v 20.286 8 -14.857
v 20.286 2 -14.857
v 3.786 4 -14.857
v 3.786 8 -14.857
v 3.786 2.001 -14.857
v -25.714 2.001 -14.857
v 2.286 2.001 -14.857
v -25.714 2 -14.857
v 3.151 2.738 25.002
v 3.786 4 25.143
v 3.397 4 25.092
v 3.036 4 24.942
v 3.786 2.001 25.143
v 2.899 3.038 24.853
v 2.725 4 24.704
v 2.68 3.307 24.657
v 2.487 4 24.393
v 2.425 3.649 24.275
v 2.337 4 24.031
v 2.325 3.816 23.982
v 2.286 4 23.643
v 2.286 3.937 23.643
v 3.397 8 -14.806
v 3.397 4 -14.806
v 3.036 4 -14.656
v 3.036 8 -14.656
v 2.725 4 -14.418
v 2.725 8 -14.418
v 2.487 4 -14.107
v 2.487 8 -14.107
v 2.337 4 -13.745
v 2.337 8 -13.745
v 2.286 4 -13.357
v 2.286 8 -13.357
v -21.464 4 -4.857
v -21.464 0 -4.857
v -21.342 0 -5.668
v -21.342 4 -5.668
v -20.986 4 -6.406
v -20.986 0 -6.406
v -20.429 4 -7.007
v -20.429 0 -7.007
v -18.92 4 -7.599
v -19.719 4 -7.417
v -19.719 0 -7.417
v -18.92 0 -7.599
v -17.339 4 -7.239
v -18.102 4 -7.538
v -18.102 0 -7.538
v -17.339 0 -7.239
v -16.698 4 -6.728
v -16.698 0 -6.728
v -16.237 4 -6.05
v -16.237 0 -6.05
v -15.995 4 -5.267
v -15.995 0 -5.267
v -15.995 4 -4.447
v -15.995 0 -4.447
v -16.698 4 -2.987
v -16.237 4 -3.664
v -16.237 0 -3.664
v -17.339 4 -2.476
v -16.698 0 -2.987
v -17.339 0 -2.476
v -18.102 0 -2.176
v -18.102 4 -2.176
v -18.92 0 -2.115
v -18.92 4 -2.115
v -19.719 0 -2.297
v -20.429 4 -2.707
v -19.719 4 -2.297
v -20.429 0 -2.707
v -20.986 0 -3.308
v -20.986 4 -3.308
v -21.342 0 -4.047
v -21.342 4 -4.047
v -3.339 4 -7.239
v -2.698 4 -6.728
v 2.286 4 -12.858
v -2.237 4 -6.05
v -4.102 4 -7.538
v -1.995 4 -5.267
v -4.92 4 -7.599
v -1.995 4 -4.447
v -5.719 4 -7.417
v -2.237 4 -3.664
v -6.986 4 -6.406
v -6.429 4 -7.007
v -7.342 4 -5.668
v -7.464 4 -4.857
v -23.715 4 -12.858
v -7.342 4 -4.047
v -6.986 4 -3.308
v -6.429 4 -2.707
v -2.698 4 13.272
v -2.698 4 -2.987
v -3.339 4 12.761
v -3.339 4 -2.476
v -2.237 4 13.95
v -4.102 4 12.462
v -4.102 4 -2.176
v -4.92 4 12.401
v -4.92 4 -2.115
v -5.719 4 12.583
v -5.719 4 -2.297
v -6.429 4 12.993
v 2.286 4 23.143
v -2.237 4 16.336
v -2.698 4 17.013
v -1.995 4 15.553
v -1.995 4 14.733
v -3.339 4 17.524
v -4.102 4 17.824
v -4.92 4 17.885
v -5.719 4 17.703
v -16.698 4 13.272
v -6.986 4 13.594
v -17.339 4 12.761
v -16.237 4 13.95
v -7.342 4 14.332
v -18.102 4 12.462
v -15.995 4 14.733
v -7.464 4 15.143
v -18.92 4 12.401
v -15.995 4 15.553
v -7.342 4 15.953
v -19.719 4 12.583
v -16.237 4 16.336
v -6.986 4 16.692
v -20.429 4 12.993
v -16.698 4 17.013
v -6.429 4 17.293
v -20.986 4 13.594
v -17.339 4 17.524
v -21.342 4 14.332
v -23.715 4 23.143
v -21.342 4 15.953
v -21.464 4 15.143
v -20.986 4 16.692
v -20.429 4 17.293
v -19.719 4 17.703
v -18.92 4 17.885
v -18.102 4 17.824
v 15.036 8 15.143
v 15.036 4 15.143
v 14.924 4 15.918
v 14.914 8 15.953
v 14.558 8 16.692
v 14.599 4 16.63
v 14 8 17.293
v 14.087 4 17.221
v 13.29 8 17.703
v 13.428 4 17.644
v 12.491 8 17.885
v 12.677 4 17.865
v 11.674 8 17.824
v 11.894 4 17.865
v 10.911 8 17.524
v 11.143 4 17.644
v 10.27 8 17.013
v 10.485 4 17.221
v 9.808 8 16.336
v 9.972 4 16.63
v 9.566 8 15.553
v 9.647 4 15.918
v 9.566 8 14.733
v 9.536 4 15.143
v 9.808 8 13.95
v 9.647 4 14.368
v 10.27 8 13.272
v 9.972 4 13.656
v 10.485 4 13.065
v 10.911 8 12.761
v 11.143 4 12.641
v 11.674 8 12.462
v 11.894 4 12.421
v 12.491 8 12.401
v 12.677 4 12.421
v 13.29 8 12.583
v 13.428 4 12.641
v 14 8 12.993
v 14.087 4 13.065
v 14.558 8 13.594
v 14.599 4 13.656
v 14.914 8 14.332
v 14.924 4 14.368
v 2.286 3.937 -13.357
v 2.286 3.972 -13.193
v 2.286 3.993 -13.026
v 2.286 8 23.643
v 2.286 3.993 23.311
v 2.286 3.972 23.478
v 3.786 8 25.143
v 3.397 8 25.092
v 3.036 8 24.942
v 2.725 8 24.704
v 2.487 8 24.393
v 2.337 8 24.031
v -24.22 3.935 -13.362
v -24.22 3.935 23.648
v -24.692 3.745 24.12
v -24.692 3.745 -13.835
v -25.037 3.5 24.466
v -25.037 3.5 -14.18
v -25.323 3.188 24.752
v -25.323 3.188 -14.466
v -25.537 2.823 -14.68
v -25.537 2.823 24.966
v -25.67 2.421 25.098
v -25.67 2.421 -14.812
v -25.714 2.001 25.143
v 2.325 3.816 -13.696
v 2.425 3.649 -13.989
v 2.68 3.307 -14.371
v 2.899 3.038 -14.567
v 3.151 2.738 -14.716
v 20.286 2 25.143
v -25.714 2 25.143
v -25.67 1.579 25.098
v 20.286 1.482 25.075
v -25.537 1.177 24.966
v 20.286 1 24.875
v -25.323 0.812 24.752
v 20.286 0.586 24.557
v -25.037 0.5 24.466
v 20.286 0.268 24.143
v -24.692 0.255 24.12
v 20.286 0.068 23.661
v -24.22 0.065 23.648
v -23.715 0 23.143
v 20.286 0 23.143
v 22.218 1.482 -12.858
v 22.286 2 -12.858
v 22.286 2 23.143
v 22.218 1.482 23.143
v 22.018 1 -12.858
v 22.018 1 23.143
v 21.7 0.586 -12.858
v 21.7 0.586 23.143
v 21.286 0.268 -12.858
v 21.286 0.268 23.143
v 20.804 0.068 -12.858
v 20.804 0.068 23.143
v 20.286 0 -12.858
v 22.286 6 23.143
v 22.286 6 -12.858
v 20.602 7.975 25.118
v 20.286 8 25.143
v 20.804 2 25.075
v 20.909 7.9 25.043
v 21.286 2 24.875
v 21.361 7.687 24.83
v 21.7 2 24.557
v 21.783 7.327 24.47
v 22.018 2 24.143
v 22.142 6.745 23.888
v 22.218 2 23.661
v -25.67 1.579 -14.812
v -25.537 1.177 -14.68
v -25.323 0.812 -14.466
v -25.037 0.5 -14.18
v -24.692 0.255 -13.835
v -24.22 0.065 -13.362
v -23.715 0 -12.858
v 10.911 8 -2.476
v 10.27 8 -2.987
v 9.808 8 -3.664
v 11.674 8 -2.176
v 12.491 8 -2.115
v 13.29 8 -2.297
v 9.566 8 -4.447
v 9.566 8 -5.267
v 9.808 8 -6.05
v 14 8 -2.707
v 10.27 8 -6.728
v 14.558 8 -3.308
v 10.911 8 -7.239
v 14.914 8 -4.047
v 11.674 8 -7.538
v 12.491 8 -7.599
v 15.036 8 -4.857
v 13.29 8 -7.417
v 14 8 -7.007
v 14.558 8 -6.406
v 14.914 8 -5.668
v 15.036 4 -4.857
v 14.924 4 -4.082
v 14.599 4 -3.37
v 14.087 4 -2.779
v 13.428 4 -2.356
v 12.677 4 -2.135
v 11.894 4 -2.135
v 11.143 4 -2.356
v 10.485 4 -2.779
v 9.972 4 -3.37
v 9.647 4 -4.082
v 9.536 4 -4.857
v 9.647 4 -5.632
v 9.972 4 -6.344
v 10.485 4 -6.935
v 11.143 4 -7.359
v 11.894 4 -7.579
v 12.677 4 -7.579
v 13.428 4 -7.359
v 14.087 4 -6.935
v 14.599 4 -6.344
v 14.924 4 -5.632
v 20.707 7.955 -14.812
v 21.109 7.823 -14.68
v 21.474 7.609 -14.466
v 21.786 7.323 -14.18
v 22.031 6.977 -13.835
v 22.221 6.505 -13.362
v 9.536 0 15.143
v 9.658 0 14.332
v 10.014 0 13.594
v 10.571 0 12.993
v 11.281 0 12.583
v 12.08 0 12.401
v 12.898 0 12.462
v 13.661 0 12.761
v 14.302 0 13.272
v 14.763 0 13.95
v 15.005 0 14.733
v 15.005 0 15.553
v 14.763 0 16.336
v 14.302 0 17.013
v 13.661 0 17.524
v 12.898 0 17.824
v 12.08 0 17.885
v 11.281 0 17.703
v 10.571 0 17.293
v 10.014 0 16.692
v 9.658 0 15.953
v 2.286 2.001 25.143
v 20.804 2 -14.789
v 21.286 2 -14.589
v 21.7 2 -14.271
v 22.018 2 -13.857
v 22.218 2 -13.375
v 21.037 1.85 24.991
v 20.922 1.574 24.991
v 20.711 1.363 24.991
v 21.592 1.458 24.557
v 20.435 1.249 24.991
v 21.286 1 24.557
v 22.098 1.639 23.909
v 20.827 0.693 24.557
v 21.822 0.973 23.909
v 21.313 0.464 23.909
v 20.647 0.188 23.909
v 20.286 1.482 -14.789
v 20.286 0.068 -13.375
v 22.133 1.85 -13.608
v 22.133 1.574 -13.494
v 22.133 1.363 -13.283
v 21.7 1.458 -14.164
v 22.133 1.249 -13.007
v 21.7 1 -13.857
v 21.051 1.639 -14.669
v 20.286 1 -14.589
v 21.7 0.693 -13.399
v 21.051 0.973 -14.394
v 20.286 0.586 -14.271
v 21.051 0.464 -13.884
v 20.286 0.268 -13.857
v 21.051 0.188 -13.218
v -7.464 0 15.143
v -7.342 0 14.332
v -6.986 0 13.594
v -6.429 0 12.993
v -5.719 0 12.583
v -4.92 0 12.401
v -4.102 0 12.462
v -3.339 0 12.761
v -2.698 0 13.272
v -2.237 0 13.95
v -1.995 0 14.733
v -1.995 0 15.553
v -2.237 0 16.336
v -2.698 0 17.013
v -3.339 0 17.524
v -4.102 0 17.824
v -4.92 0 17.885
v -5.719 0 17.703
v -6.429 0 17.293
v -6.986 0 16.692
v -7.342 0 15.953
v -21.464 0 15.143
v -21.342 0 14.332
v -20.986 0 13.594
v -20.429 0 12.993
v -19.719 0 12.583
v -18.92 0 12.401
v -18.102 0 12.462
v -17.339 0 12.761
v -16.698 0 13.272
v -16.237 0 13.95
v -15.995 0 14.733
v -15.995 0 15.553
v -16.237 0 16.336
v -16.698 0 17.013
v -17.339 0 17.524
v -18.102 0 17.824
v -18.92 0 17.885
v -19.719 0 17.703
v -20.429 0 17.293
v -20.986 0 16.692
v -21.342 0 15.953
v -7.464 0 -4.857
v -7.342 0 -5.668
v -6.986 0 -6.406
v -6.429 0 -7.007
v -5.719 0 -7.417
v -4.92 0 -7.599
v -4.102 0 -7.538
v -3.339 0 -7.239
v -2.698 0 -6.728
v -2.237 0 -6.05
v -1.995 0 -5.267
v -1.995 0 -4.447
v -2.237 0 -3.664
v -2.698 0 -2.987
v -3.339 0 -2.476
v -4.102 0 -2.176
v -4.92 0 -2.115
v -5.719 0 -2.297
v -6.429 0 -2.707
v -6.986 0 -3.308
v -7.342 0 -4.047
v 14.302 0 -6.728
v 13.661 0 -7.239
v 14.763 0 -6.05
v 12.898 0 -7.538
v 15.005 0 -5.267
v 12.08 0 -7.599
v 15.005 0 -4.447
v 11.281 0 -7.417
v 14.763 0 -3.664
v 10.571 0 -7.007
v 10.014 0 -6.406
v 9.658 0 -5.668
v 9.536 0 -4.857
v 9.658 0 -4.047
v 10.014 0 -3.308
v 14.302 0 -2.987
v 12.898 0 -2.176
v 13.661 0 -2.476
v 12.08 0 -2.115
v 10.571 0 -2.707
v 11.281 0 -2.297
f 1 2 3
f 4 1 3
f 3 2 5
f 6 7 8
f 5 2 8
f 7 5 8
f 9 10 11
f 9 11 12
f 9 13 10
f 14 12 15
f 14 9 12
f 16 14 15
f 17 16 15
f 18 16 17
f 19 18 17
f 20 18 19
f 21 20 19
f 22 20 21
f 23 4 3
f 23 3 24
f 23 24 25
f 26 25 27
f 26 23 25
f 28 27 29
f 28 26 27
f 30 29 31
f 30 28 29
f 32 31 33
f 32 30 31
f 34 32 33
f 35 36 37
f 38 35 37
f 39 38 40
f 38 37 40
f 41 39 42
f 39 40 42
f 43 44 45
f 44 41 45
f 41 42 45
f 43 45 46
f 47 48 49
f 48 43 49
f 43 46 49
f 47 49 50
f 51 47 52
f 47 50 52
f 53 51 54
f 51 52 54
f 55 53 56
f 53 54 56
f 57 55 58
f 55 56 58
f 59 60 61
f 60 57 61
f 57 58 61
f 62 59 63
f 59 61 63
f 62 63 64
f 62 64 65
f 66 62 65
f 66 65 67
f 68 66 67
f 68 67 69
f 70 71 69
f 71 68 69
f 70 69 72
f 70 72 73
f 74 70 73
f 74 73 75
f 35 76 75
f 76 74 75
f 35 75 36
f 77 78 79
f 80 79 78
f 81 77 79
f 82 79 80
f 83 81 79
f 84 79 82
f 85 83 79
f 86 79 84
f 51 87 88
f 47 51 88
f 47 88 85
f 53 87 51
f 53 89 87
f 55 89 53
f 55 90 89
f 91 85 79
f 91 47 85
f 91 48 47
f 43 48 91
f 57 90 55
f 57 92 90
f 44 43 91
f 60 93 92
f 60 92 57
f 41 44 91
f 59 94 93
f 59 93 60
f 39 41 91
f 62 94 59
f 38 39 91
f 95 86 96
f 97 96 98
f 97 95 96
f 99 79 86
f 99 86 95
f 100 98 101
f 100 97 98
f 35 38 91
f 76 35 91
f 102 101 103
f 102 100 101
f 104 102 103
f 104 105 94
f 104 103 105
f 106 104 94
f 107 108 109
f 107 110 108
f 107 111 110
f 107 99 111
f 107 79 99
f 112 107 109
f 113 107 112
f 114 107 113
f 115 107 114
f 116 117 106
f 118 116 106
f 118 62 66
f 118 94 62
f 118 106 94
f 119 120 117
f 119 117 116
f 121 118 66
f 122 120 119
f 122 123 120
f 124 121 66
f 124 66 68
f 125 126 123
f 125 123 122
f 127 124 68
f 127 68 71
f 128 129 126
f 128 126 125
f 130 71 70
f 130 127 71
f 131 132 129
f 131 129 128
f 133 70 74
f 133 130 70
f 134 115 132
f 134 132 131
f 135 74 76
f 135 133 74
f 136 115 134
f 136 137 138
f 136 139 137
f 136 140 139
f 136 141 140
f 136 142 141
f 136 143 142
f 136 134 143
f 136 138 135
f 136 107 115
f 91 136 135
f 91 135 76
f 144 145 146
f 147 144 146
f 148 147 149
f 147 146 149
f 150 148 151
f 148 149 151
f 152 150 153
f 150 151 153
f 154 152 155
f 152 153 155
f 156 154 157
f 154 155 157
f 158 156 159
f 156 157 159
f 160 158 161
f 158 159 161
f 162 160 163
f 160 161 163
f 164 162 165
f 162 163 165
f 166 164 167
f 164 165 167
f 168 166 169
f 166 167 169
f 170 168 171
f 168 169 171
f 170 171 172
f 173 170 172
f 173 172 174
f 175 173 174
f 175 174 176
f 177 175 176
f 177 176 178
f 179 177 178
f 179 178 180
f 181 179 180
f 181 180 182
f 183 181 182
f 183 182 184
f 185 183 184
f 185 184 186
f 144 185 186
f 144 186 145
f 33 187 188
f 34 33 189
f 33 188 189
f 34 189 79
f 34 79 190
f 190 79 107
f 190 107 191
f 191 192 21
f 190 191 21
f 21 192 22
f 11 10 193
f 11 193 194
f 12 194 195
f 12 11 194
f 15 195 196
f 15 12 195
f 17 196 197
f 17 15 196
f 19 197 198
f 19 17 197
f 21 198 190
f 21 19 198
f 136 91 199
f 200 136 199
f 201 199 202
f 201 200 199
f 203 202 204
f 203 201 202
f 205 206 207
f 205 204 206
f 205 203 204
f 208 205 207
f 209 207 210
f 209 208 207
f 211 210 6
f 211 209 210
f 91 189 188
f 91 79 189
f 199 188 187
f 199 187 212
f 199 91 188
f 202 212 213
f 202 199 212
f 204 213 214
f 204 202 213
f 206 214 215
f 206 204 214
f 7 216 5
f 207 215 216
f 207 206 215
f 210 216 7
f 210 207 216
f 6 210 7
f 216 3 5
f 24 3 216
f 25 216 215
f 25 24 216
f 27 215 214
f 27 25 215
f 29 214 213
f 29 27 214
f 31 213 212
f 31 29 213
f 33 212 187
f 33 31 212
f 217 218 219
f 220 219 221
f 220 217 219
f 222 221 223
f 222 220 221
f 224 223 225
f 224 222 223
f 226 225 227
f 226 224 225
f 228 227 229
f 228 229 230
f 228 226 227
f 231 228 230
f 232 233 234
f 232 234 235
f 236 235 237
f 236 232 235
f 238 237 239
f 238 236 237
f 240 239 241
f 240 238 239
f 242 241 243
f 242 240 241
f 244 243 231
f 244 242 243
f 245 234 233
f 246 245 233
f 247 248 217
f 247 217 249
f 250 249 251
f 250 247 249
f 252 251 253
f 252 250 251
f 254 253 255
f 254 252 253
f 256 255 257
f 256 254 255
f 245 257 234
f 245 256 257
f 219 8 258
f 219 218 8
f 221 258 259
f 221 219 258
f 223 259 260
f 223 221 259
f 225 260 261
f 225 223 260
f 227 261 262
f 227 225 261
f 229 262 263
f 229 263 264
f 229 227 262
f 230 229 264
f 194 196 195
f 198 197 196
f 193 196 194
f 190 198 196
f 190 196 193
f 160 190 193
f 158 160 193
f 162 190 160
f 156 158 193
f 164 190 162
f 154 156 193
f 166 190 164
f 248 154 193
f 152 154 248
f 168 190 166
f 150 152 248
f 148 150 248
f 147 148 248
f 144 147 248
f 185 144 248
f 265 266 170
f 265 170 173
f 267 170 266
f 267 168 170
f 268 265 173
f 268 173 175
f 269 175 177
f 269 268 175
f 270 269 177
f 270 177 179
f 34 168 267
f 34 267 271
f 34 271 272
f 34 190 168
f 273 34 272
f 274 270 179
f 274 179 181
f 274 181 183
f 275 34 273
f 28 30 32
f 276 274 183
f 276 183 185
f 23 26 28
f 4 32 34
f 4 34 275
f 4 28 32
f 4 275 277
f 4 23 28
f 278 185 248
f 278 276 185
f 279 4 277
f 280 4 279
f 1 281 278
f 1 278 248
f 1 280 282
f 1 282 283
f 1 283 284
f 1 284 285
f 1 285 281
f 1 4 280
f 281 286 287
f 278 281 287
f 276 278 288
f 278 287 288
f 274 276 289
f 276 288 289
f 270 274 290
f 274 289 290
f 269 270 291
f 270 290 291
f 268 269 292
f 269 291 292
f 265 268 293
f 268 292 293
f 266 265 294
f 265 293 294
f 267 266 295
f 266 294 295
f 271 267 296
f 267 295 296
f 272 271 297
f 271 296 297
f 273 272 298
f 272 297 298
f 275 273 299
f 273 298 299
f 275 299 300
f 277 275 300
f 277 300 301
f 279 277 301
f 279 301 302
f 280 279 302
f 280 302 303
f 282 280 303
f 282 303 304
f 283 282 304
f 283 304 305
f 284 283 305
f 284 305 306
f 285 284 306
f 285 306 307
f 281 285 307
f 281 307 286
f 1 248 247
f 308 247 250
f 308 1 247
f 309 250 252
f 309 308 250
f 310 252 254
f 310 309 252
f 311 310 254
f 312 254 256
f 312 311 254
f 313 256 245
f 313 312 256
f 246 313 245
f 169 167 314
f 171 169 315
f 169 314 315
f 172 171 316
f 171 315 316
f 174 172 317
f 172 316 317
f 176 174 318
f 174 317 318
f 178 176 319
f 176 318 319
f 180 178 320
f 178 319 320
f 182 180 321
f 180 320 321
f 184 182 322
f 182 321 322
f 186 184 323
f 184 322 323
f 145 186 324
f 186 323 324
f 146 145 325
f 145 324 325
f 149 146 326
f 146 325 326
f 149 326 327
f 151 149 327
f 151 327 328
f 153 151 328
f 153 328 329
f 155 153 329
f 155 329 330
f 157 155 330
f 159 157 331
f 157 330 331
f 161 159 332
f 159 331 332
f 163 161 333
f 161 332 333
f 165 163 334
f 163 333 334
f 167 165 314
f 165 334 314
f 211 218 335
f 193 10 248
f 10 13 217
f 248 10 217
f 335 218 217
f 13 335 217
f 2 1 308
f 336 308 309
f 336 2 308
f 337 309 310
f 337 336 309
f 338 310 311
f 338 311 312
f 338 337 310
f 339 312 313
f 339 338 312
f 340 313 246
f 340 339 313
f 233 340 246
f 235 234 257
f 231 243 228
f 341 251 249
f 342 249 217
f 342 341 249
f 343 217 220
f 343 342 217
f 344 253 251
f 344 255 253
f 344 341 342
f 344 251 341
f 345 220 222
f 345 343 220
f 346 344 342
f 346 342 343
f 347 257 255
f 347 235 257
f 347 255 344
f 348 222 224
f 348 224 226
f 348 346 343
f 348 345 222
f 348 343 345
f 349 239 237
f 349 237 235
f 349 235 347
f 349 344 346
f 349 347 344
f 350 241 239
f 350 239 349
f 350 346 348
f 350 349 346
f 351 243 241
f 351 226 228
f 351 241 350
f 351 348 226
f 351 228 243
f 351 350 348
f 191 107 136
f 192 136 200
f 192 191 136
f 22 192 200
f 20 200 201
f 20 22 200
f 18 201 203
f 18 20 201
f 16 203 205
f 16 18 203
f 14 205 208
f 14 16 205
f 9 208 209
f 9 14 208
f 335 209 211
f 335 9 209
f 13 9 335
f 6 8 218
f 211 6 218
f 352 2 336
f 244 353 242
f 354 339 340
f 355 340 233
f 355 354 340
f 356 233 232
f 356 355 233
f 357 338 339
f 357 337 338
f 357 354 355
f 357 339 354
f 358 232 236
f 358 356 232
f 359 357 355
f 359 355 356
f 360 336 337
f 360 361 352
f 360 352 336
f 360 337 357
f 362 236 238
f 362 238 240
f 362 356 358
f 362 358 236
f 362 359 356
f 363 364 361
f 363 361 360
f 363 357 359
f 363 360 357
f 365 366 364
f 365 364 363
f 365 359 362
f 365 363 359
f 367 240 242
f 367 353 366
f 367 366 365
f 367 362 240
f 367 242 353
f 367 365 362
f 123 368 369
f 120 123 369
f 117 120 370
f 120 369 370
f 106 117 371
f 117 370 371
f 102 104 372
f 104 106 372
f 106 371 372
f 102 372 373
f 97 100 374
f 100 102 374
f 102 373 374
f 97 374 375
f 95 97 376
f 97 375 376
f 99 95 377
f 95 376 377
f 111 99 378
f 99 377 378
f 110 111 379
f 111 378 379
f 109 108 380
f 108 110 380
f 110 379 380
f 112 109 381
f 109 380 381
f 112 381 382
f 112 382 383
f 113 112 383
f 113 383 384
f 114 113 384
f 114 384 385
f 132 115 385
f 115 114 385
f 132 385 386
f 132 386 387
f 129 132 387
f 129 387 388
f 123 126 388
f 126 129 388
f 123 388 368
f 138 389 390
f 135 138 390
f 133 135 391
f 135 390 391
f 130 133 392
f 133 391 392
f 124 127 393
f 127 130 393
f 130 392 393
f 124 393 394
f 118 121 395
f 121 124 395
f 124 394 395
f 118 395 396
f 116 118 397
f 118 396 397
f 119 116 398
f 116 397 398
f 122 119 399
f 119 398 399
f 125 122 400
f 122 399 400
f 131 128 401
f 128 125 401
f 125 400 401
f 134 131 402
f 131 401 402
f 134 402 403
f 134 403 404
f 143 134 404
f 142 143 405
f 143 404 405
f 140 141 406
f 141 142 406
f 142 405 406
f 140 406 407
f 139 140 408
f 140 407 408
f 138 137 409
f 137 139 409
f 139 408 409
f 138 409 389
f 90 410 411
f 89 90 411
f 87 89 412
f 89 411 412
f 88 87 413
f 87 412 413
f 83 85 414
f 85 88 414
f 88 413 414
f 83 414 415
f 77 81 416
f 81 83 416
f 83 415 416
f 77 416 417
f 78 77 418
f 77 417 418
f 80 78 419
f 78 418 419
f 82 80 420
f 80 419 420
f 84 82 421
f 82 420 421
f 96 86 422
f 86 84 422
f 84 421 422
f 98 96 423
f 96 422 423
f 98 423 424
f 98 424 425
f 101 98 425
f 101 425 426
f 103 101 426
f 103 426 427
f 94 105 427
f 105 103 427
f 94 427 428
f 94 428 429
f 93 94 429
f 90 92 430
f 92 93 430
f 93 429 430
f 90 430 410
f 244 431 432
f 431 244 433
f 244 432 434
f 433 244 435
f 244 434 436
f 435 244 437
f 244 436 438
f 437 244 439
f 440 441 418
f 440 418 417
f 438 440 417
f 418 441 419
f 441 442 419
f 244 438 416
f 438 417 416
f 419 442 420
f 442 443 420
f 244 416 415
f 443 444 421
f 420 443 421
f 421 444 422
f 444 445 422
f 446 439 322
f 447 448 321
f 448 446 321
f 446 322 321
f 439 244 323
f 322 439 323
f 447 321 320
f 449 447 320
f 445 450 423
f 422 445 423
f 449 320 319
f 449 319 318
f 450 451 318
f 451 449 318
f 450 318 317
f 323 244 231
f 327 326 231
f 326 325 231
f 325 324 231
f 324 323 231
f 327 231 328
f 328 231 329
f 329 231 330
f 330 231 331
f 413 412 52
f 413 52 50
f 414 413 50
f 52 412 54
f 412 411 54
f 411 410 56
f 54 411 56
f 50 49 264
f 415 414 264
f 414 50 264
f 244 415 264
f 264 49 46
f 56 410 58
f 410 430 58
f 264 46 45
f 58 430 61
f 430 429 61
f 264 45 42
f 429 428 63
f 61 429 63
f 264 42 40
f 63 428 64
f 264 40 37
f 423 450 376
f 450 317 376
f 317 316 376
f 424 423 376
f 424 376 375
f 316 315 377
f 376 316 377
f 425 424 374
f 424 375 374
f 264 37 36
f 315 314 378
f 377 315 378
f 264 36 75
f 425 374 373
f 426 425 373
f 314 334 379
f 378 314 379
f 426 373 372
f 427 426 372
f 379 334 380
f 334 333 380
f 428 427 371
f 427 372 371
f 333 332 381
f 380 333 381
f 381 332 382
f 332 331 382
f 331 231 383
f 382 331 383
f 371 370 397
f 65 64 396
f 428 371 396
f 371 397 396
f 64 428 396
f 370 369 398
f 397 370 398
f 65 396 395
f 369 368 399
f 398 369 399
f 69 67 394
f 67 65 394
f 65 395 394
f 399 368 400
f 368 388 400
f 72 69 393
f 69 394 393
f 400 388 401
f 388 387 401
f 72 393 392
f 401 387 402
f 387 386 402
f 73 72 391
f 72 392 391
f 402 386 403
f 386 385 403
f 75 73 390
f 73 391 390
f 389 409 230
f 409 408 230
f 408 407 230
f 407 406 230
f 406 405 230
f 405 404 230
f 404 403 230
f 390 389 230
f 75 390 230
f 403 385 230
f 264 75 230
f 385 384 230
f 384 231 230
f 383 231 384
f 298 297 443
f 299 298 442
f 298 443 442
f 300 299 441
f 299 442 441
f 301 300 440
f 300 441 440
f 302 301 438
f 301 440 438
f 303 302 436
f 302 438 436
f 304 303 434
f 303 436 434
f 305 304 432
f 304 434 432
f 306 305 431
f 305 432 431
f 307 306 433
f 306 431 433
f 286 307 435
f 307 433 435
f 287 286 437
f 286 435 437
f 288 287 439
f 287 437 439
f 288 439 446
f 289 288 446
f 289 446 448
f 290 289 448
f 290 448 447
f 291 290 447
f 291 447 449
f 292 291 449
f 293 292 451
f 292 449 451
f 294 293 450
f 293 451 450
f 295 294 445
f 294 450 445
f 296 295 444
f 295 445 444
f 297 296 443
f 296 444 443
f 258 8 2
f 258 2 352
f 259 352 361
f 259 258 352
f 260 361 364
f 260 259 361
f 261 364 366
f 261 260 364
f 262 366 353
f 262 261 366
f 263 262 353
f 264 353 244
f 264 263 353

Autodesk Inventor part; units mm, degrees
ref_plane "YZ Plane" through (0, 0, 0) normal (1, 0, 0) x (0, 1, 0)
ref_plane "XZ Plane" through (0, 0, 0) normal (0, 1, 0) x (-1, 0, 0)
ref_plane "XY Plane" through (0, 0, 0) normal (0, 0, 1) x (1, 0, 0)
sketch "Sketch1" plane through (0, 0, 0) normal (0, 1, 0) x (-1, 0, 0)
  line L0 (25.7143, 25.1429) -> (-22.2857, 25.1429)
  line L1 (-22.2857, 25.1429) -> (-22.2857, -14.8571)
  line L2 (-22.2857, -14.8571) -> (25.7143, -14.8571)
  line L3 (25.7143, -14.8571) -> (25.7143, 25.1429)
  circle A0 centre (18.7143, 15.1429) radius 2.75
  circle A1 centre (18.7143, -4.8571) radius 2.75
  circle A2 centre (4.7143, -4.8571) radius 2.75
  circle A3 centre (4.7143, 15.1429) radius 2.75
  circle A4 centre (-12.2857, 15.1429) radius 2.75
  circle A5 centre (-12.2857, -4.8571) radius 2.75
  point P0 (0, 0)
  dimension "d0" = 48
  dimension "d1" = 40
  dimension "d2" = 5.5
  dimension "d3" = 5.5
  dimension "d4" = 5.5
  dimension "d5" = 5.5
  dimension "d6" = 5.5
  dimension "d7" = 5.5
  dimension "d8" = 7
  dimension "d9" = 14
  dimension "d10" = 17
  dimension "d12" = 20
  dimension "d13" = 10
  dimension "d24" = 10
extrude "Extrusion1" add sketch "Sketch1" along normal blind 4
sketch "Sketch3" plane through (0, 4, 0) normal (0, 1, 0) x (1, 0, 0)
  line L0 (22.2857, -25.1429) -> (22.2857, 14.8571) projected
  line L1 (-25.7143, -25.1429) -> (22.2857, -25.1429) projected
  line L2 (22.2857, 14.8571) -> (2.2857, 14.8571)
  line L3 (2.2857, 14.8571) -> (2.2857, -25.1429)
  line L4 (2.2857, -25.1429) -> (22.2857, -25.1429)
  line L5 (22.2857, -25.1429) -> (22.2857, 14.8571)
  point P0 (0, 0)
  dimension "d17" = 20
extrude "Extrusion2" add sketch "Sketch3" along normal blind 4
sketch "Sketch4" plane through (12.2857, 4, 15.1429) normal (0, -1, 0) x (1, 0, 0)
  circle A0 centre (0, 0) radius 2.75
  circle A1 centre (0, -20) radius 2.75 projected
  circle A2 centre (0, -20) radius 2.75
  point P0 (-12.2857, -15.1429)
extrude "Extrusion3" cut sketch "Sketch4" against normal blind 4
fillet "Fillet2" radius 2 10 edges at (-1.7143, 0, -14.8571) (22.2857, 4, -14.8571) (22.2857, 0, 5.1429) (-1.7143, 0, 25.1429) (-25.7143, 0, 5.1429) (-25.7143, 4, 5.1429) (-11.7143, 4, 25.1429) (-11.7143, 4, -14.8571) (22.2857, 8, 5.1429) (22.2857, 4, 25.1429)
fillet "Fillet3" radius 1.5 4 edges at (2.2857, 3.0003, 25.1429) (2.2857, 6, 25.1429) (2.2857, 6, -14.8571) (2.2857, 3.0003, -14.8571)
properties part number "syringepumpplate_bottom"
